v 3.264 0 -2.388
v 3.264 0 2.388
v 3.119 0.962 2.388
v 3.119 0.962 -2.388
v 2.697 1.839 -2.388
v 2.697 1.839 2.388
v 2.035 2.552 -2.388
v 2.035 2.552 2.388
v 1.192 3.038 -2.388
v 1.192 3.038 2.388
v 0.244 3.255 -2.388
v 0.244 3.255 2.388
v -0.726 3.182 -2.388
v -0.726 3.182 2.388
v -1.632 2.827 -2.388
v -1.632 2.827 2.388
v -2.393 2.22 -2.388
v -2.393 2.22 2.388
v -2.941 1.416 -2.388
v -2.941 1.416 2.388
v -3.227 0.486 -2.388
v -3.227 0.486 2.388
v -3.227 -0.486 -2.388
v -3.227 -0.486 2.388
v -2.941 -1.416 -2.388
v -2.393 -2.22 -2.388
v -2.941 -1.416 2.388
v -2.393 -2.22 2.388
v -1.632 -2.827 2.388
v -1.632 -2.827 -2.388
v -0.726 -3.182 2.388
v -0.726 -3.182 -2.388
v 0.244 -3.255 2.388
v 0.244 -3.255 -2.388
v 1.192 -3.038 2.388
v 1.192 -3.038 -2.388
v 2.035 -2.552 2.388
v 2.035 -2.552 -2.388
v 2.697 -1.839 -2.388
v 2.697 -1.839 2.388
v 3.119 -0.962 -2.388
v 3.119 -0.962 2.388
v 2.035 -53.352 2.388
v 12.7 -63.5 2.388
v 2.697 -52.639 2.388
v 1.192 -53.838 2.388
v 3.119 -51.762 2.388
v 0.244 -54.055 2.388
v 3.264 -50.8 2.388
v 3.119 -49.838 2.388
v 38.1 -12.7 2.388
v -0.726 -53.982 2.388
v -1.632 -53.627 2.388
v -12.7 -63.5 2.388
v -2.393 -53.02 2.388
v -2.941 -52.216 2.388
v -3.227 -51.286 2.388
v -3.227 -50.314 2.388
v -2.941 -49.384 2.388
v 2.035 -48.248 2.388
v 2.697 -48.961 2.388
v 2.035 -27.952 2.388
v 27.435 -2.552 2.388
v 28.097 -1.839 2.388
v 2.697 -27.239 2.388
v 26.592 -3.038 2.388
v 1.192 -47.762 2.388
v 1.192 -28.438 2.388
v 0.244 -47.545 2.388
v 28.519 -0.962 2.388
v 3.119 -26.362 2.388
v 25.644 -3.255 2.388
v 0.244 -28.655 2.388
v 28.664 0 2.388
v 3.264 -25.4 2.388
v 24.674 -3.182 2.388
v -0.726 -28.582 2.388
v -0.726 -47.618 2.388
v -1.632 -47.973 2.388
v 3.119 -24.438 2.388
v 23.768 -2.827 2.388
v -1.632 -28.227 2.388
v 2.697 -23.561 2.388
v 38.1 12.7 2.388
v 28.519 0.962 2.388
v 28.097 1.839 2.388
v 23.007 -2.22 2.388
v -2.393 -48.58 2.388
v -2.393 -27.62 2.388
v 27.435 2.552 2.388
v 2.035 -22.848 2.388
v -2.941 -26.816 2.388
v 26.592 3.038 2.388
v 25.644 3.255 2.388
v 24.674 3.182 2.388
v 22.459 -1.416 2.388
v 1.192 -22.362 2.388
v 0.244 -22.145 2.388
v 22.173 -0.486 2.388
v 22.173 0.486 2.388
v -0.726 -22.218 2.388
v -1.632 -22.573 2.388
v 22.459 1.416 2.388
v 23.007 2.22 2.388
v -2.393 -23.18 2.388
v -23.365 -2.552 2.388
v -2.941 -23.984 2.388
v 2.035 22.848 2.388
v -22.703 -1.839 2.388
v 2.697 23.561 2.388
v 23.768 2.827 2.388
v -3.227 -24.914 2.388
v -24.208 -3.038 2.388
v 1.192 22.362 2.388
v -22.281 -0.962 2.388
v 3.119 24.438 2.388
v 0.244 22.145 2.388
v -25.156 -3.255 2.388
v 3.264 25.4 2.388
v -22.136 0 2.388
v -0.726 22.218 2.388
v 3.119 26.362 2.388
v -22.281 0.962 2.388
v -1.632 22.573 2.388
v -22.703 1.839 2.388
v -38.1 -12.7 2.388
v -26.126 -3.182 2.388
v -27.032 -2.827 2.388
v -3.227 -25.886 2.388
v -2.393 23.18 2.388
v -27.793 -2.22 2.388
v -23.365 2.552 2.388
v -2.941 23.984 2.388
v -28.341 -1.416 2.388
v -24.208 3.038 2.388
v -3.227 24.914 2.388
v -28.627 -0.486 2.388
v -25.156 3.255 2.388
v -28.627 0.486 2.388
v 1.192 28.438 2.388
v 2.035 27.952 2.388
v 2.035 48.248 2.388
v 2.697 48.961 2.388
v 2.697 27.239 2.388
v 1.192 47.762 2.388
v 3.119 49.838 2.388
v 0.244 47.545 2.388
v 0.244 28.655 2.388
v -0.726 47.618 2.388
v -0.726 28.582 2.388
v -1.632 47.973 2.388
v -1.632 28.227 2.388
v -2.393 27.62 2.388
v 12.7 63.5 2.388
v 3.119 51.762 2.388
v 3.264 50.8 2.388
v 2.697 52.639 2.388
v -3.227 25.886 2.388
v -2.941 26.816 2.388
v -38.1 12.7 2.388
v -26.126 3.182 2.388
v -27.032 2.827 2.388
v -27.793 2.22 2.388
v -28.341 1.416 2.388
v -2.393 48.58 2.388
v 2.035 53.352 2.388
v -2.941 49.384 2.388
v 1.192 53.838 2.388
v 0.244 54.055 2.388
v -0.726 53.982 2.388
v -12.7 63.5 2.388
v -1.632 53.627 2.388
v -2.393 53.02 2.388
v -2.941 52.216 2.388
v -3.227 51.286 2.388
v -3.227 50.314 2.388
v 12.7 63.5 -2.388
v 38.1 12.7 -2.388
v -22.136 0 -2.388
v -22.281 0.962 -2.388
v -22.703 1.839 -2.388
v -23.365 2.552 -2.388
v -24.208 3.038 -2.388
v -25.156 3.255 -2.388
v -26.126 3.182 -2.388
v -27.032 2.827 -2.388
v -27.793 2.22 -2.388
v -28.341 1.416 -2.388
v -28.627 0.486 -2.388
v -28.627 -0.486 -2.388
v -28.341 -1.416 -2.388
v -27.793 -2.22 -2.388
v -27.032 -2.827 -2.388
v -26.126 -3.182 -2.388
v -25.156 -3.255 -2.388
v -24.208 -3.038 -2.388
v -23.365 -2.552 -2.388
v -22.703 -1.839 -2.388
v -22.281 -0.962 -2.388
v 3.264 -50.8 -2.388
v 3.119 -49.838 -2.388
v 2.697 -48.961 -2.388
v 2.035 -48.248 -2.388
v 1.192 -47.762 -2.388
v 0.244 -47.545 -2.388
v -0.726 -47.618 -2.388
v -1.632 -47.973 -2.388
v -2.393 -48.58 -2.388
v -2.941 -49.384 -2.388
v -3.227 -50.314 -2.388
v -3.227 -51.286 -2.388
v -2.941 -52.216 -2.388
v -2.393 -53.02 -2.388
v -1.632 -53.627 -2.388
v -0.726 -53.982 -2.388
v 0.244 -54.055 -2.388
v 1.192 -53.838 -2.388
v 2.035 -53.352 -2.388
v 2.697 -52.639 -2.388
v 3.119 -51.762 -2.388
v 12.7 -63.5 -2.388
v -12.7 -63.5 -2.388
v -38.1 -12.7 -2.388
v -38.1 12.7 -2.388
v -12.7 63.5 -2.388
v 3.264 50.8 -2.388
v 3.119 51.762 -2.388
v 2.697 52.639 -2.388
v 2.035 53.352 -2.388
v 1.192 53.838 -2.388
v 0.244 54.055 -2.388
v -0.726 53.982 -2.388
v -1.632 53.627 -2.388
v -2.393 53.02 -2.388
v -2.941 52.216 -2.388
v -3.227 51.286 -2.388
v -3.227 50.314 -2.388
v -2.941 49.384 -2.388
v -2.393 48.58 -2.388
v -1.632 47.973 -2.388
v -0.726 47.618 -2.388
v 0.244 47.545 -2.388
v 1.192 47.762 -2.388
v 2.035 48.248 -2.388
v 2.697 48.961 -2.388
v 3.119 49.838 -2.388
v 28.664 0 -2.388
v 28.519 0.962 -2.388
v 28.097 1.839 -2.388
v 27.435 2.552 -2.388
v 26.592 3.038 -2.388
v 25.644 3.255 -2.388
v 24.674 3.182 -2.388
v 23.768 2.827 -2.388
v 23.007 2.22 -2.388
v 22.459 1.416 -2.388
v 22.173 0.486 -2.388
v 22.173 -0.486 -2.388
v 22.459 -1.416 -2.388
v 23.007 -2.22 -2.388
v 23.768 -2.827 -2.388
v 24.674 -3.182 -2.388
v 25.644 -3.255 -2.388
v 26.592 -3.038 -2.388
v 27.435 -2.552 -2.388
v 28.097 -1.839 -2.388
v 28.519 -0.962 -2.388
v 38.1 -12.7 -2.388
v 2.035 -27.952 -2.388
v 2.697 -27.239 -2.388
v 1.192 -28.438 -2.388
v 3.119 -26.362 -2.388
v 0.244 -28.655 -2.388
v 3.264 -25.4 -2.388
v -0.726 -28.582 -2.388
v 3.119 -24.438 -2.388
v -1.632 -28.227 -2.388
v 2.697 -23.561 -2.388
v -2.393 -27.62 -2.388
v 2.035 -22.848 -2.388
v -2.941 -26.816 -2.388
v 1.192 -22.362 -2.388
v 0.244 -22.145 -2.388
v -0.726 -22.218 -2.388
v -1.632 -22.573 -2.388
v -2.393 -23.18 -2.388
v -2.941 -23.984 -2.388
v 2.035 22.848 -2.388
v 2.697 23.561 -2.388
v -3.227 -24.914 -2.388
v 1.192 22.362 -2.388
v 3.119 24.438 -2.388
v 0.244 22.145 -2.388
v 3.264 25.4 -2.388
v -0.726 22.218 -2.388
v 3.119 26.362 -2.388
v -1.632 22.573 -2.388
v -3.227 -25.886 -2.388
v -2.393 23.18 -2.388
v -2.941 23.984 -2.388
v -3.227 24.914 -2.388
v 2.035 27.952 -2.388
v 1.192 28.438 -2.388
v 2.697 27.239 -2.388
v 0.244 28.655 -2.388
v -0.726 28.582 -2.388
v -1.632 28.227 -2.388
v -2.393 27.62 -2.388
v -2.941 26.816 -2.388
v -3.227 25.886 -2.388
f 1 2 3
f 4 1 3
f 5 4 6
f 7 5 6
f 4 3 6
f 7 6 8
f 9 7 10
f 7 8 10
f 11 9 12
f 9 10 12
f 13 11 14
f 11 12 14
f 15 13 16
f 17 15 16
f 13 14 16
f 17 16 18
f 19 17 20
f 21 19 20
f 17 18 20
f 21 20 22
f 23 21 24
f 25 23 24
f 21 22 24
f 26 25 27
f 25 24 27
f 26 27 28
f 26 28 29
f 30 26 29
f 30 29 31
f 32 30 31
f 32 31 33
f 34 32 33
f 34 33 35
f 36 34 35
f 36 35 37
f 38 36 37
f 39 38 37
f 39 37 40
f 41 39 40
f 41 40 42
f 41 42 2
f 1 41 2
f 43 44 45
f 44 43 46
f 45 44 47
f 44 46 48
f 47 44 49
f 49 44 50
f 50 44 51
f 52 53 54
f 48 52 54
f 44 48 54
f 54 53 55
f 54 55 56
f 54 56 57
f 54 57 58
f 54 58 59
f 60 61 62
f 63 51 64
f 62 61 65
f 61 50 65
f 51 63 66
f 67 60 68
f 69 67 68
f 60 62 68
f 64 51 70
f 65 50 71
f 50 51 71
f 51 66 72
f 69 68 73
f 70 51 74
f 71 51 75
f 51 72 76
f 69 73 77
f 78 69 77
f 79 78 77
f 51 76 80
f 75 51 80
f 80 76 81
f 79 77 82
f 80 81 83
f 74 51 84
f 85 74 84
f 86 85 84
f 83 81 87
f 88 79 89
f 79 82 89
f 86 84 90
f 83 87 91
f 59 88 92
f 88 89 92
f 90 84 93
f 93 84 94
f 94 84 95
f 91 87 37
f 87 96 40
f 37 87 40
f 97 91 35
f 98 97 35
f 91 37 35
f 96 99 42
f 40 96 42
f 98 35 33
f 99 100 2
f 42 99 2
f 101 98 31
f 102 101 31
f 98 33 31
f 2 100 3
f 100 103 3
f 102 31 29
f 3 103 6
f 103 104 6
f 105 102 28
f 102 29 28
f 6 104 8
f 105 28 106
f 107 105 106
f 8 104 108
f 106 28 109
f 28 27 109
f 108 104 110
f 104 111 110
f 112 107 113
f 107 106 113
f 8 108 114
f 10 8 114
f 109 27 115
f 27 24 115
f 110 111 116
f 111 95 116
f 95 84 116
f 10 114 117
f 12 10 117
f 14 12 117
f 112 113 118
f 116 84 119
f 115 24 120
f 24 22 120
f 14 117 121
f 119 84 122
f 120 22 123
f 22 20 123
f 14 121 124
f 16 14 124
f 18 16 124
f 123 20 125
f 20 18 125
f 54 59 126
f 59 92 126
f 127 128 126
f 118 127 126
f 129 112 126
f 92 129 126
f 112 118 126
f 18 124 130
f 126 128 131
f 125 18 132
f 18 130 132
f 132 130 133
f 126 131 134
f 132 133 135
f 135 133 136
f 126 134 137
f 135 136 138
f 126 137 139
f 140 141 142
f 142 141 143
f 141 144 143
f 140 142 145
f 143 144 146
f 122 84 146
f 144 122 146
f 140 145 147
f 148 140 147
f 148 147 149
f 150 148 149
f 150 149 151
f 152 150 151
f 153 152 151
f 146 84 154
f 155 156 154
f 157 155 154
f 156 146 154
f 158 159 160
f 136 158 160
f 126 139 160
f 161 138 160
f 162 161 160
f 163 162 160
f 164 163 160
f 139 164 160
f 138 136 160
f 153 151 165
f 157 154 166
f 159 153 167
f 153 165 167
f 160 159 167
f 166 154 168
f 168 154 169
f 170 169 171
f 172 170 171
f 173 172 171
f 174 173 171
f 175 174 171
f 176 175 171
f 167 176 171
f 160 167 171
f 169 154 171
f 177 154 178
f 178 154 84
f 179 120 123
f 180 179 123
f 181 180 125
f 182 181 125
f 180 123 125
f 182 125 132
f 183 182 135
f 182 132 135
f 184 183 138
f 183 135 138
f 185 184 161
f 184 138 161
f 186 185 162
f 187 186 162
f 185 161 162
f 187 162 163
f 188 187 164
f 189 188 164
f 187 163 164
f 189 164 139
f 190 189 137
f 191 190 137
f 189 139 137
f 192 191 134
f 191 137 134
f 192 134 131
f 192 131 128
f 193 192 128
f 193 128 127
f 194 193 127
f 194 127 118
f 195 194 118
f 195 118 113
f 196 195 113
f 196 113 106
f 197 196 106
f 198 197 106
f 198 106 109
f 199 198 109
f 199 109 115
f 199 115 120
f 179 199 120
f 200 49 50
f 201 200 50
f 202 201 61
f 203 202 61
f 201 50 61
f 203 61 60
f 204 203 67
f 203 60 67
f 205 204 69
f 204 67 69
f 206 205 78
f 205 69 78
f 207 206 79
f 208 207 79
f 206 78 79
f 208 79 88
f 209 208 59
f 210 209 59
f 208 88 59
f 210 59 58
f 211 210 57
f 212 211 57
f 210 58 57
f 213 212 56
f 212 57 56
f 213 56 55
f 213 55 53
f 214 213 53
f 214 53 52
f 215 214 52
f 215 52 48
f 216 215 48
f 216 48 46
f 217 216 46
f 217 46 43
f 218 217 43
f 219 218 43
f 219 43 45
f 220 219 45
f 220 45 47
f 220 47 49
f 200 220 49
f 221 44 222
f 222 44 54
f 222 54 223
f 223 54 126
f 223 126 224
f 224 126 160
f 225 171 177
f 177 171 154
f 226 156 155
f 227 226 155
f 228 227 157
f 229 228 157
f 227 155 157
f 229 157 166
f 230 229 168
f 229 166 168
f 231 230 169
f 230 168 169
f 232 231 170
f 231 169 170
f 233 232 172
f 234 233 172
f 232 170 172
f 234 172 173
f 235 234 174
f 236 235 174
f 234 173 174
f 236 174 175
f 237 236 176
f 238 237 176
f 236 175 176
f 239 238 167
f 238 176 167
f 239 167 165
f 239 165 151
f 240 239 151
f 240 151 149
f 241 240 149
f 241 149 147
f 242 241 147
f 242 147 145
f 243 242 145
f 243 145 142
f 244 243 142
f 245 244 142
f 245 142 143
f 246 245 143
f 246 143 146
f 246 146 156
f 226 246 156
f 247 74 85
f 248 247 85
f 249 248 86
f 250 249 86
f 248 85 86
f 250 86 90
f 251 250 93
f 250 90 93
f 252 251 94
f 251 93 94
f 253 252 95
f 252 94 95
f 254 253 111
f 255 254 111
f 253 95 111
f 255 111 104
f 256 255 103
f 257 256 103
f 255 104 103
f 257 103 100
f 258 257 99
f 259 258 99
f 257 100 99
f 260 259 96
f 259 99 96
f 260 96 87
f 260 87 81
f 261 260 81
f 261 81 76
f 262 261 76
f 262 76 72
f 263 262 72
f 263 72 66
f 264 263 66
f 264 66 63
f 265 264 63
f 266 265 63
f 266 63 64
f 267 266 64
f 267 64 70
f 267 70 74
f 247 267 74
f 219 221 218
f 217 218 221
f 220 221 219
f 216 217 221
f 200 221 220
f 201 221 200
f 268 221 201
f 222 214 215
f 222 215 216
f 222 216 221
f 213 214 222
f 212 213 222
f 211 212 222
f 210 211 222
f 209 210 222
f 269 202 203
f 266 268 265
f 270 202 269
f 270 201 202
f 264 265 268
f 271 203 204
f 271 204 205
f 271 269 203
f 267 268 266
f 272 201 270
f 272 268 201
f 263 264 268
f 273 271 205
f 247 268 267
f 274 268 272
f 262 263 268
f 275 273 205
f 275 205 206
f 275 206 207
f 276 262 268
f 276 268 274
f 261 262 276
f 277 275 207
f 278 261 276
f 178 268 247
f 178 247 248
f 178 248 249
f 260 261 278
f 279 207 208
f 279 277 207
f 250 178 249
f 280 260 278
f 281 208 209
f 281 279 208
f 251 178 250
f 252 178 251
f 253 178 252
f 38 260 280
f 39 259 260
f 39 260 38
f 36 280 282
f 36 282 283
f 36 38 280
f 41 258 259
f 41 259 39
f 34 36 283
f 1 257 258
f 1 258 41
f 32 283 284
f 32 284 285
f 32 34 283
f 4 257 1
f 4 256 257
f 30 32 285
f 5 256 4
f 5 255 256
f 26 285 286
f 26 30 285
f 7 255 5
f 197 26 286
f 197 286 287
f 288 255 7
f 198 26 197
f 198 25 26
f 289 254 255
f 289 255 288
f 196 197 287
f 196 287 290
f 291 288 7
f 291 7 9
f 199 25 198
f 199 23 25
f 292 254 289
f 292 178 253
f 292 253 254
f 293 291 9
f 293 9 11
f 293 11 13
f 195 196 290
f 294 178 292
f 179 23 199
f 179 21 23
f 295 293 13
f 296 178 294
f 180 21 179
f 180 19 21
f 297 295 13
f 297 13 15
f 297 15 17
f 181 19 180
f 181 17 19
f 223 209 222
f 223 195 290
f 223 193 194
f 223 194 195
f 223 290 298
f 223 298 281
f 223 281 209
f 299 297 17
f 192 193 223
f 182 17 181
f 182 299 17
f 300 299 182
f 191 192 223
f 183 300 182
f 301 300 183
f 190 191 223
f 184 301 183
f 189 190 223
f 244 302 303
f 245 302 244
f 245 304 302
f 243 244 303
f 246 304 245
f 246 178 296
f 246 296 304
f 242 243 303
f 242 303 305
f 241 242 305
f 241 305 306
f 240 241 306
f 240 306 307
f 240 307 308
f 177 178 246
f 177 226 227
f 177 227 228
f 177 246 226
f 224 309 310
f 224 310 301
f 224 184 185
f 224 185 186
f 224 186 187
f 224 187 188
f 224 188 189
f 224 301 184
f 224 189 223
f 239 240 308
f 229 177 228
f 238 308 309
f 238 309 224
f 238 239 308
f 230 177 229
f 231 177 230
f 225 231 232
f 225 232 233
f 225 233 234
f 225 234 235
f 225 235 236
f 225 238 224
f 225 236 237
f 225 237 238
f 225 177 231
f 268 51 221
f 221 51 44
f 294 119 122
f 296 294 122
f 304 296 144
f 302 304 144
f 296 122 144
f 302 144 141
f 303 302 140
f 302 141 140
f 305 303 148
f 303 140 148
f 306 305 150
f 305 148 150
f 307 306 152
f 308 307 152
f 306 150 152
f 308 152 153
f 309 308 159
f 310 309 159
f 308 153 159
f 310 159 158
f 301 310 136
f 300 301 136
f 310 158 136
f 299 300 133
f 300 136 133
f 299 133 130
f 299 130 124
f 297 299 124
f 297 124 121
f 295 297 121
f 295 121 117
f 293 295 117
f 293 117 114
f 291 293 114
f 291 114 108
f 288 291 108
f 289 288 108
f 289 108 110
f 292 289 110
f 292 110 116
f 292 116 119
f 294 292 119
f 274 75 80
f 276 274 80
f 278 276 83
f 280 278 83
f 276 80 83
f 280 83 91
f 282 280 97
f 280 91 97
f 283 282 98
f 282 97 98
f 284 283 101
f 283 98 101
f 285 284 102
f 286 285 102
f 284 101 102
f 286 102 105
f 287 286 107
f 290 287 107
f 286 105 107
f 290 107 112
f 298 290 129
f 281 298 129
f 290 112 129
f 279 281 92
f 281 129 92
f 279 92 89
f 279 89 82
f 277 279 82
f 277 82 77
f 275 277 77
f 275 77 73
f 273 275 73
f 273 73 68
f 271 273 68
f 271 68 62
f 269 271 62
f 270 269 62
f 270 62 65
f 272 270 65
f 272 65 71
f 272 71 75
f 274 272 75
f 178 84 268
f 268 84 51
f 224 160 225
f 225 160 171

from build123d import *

# Parameters (mm, degrees)
BOSS_EXTRUDE1_DEPTH      = 2.3876
BOSS_EXTRUDE1_DEPTH_BACK = 2.3876
SKETCH4_R                = 3.2639
CUT_EXTRUDE1_DEPTH       = 1
CUT_EXTRUDE1_DEPTH_BACK  = 5.7752
SKETCH5_R                = 3.2639
CUT_EXTRUDE2_DEPTH       = 5.7752


with BuildPart() as part:
    # Sketch3 → Boss-Extrude1 (new body, two sides)
    with BuildSketch(Plane.XY) as boss_extrude1_sk:
        Polygon((-12.7, 63.5), (12.7, 63.5), (38.1, 12.7), (38.1, -12.7), (12.7, -63.5), (-12.7, -63.5), (-38.1, -12.7), (-38.1, 12.7), align=None)
    extrude(amount=BOSS_EXTRUDE1_DEPTH)
    extrude(boss_extrude1_sk.sketch, amount=-BOSS_EXTRUDE1_DEPTH_BACK)

    # Sketch4 → Cut-Extrude1 (cut, two sides)
    with BuildSketch(Plane.XY.offset(2.3876)) as cut_extrude1_sk:
        with Locations((0, 50.8)):
            Circle(SKETCH4_R)
        with Locations((0, 25.4)):
            Circle(SKETCH4_R)
        Circle(SKETCH4_R)
        with Locations((0, -25.4)):
            Circle(SKETCH4_R)
        with Locations((0, -50.8)):
            Circle(SKETCH4_R)
    extrude(amount=CUT_EXTRUDE1_DEPTH, mode=Mode.SUBTRACT)
    extrude(cut_extrude1_sk.sketch, amount=-CUT_EXTRUDE1_DEPTH_BACK, mode=Mode.SUBTRACT)

    # Sketch5 → Cut-Extrude2 (cut, through all)
    with BuildSketch(Plane.XY.offset(2.3876)):
        with Locations((25.4, 0)):
            Circle(SKETCH5_R)
        with Locations((-25.4, 0)):
            Circle(SKETCH5_R)
    extrude(amount=-CUT_EXTRUDE2_DEPTH, mode=Mode.SUBTRACT)


solid = part.part
